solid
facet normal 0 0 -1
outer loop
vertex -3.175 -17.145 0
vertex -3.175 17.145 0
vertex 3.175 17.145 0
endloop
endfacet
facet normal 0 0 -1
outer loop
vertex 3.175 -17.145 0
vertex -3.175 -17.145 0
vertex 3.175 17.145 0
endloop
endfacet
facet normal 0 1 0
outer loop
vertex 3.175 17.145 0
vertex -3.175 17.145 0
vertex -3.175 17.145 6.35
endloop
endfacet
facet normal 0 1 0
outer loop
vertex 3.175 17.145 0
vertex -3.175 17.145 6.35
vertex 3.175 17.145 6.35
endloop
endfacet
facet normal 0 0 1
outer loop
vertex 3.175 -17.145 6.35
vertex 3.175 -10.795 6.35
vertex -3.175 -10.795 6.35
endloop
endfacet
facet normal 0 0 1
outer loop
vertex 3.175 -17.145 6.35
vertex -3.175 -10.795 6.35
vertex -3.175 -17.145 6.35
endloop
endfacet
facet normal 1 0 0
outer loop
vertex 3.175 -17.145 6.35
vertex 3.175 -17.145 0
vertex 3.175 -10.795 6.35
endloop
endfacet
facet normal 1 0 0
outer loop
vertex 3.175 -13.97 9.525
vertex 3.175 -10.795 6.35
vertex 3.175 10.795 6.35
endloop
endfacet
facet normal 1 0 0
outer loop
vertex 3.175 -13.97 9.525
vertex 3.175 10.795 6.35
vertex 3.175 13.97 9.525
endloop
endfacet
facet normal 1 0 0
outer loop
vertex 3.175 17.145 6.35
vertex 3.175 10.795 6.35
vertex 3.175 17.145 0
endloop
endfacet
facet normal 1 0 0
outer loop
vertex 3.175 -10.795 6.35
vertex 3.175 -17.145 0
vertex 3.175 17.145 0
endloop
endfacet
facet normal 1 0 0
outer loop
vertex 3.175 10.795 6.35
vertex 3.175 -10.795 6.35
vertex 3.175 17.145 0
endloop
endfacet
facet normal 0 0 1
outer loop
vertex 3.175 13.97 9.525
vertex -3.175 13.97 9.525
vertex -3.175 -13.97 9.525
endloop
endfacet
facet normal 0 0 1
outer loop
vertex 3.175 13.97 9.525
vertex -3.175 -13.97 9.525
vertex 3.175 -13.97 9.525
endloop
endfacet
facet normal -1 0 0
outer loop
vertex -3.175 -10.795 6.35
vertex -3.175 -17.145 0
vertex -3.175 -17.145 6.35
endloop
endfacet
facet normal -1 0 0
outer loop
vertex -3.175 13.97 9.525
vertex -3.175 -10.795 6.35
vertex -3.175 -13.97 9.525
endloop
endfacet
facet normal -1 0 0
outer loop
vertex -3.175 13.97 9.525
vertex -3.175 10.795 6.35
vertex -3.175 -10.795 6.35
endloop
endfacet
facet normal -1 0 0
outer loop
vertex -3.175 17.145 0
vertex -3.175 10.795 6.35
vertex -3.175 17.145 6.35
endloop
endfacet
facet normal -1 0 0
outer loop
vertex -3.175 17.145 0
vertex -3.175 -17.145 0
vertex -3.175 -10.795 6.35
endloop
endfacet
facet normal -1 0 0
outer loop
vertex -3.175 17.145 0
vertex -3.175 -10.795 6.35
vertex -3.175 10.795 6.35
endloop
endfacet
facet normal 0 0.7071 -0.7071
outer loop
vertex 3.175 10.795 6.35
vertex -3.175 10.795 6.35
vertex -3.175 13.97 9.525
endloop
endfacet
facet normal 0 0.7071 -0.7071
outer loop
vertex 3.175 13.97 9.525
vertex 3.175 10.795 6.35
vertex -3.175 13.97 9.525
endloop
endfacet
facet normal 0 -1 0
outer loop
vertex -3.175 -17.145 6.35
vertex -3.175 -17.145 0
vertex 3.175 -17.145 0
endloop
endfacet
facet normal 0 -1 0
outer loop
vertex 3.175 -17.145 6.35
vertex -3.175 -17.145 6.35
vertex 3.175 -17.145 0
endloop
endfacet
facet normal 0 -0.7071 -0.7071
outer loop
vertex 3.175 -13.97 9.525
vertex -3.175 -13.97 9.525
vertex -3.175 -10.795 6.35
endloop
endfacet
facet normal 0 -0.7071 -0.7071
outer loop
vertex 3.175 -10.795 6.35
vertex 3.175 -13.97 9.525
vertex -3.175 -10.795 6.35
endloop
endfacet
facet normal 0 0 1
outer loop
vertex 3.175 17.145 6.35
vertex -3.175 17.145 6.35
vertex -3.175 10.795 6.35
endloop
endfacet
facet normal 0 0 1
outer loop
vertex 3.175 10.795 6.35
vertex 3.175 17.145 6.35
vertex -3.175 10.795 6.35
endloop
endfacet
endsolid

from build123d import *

# Parameters (mm, degrees)
F0_W     = 6.35
F0_H     = 34.29
F1_DEPTH = 9.525
F3_DEPTH = 6.351


with BuildPart() as f1:
    # F0 (on Top) → F1 (new body)
    with BuildSketch(Plane.XY):
        Rectangle(F0_W, F0_H)
    extrude(amount=F1_DEPTH)

    # F2 (on face) → F3 (cut, through all)
    with BuildSketch(Plane(origin=(-3.175, 0, 0), x_dir=(0, -1, 0), z_dir=(-1, 0, 0))):
        Polygon((-17.145, 9.525), (-17.145, 6.35), (-10.795, 6.35), (-13.97, 9.525), align=None)
        Polygon((17.145, 9.525), (13.97, 9.525), (10.795, 6.35), (17.145, 6.35), align=None)
    extrude(amount=-F3_DEPTH, mode=Mode.SUBTRACT)


solid = f1.part
